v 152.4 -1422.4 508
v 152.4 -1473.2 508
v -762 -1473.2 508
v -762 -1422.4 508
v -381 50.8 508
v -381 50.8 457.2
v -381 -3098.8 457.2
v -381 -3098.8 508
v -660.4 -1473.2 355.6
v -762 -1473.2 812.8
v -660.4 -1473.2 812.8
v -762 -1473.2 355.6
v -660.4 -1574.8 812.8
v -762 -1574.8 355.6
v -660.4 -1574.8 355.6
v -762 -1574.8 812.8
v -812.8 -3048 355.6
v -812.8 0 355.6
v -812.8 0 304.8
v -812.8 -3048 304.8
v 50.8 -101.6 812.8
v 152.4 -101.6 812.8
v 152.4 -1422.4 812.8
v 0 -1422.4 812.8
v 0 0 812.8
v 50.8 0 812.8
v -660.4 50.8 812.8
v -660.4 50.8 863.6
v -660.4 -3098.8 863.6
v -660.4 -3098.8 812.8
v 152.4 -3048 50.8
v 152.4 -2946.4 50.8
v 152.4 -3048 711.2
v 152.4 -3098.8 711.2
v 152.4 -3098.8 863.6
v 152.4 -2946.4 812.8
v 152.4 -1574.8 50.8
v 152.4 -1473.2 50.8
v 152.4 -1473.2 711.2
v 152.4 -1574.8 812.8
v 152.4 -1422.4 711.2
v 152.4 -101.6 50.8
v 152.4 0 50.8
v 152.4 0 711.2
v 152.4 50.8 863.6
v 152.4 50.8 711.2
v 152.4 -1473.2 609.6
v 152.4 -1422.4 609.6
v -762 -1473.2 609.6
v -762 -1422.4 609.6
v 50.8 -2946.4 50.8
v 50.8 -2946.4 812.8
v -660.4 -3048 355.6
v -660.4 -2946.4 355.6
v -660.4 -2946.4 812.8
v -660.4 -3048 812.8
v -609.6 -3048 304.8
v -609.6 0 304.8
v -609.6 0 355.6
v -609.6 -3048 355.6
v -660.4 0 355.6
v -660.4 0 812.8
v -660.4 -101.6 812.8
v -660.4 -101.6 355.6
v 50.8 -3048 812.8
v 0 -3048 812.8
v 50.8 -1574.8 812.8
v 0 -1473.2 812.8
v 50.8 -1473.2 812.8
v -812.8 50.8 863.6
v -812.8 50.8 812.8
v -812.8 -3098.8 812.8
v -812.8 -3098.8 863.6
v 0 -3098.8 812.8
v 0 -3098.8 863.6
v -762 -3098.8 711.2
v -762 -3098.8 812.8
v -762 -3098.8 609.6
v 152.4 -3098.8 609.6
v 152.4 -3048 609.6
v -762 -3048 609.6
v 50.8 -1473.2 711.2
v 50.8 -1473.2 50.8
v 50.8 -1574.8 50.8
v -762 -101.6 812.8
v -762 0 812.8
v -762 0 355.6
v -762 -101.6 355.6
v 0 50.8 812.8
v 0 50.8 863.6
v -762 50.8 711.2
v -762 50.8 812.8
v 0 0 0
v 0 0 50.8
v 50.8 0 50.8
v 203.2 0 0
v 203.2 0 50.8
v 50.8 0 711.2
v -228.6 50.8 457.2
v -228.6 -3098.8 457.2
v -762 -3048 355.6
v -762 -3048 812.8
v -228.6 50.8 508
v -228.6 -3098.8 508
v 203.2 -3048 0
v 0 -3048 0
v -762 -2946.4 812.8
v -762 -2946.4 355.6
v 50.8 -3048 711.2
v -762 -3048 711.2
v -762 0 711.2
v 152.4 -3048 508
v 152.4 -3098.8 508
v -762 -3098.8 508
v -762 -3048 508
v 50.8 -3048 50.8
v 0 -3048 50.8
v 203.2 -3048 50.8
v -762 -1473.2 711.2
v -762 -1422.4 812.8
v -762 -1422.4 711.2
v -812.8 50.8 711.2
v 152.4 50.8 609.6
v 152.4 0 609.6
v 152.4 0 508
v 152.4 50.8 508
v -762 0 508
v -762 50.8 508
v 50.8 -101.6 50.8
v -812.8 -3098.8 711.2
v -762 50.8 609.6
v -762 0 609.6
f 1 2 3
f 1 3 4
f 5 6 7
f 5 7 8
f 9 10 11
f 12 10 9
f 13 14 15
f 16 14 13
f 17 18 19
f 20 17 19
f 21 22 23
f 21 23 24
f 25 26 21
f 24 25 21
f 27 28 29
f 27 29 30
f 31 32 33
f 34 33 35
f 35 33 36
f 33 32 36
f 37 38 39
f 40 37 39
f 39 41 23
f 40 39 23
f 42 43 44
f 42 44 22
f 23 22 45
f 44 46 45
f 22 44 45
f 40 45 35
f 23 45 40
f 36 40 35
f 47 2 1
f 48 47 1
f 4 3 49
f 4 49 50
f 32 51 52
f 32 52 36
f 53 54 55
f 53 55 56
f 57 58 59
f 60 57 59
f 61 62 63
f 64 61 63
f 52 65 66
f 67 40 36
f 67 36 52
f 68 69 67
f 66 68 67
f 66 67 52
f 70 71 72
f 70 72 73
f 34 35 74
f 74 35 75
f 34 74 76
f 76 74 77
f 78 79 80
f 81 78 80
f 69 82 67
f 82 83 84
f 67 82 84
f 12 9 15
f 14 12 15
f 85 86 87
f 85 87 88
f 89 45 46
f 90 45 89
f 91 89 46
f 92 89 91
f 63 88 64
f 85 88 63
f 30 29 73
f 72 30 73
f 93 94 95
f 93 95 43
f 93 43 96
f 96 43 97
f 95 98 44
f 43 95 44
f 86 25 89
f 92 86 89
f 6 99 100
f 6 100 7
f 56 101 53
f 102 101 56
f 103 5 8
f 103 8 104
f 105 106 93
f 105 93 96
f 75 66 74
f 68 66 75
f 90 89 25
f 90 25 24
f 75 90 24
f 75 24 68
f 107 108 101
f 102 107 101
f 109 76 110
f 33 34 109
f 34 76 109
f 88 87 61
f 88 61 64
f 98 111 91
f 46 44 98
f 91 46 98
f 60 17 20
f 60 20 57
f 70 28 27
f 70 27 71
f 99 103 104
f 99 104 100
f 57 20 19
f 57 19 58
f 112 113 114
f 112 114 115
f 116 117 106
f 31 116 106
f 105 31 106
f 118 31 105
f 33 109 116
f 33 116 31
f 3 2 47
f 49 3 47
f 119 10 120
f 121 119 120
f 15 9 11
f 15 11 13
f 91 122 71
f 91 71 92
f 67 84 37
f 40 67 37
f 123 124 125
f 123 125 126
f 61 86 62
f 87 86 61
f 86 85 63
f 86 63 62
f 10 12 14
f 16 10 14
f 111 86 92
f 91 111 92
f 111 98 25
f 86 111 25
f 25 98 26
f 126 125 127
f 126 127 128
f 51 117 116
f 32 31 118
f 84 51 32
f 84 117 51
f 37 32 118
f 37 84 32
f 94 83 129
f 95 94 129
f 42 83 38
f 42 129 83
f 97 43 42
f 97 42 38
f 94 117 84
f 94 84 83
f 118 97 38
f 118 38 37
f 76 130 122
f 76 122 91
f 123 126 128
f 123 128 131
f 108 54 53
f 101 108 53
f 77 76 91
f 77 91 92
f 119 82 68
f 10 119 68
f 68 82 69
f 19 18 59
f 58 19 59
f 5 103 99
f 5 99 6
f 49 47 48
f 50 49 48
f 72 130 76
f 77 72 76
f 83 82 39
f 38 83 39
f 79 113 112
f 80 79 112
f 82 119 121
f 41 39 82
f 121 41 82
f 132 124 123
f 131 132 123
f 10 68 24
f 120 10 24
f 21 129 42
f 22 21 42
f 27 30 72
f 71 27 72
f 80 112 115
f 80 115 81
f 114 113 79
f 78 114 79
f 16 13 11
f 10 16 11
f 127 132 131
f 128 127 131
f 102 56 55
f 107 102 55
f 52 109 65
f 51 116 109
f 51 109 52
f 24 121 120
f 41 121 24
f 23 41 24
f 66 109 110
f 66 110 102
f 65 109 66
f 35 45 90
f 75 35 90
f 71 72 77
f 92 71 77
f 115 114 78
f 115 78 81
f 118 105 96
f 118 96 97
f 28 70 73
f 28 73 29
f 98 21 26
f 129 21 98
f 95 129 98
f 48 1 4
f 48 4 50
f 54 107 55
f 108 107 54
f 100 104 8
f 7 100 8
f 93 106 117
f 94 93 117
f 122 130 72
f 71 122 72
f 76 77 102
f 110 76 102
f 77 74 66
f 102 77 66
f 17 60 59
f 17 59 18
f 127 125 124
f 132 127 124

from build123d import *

# Parameters (mm, degrees)
F0_W      = 203.2
F0_H      = 50.8
F1_DEPTH  = 3048
F2_W      = 101.6
F2_H      = 101.6
F2_H_2    = 50.8
F3_DEPTH  = 762
F4_W      = 50.8
F4_H      = 101.6
F5_DEPTH  = 914.4
F6_W      = 50.8
F6_H      = 101.6
F7_DEPTH  = 914.4
F8_W      = 50.8
F8_H      = 101.6
F9_DEPTH  = 914.4
F13_DEPTH = 101.6
F14_W     = 50.8
F14_H     = 101.6
F15_DEPTH = 3149.6
F17_DEPTH = 3048
F18_W     = 50.8
F18_H     = 101.6
F19_DEPTH = 914.4
F20_W     = 50.8
F20_H     = 101.6
F21_DEPTH = 914.4
F22_W     = 50.8
F22_H     = 101.6
F23_DEPTH = 914.4
F24_W     = 152.4
F24_H     = 50.8
F25_DEPTH = 3149.6
F27_DEPTH = 3149.6
F29_DEPTH = 3149.6


with BuildPart() as f1:
    # F0 (on Front) → F1 (new body)
    with BuildSketch(Plane.XZ):
        with Locations((101.6, 25.4)):
            Rectangle(F0_W, F0_H)
    extrude(amount=F1_DEPTH)

    # F2 (on face) → F3 (join)
    with BuildSketch(Plane.XY.offset(50.8)):
        with Locations((101.6, -2997.2)):
            Rectangle(F2_W, F2_H)
        with Locations((101.6, -1549.4)):
            Rectangle(F2_W, F2_H_2)
        with Locations((101.6, -1498.6)):
            Rectangle(F2_W, F2_H_2)
        with Locations((101.6, -50.8)):
            Rectangle(F2_W, F2_H)
    extrude(amount=F3_DEPTH)

    # F4 (on face) → F5 (join)
    with BuildSketch(Plane.YZ.offset(152.4)):
        with Locations((25.4, 762)):
            Rectangle(F4_W, F4_H)
    extrude(amount=-F5_DEPTH)

    # F6 (on face) → F7 (join)
    with BuildSketch(Plane.YZ.offset(152.4)):
        with Locations((-3073.4, 762)):
            Rectangle(F6_W, F6_H)
    extrude(amount=-F7_DEPTH)

    # F8 (on face) → F9 (join)
    with BuildSketch(Plane.YZ.offset(152.4)):
        with Locations((-1447.8, 762)):
            Rectangle(F8_W, F8_H)
    extrude(amount=-F9_DEPTH)

    # F24 (on face) → F25 (join)
    with BuildSketch(Plane(origin=(0, 50.8, 0), x_dir=(-1, 0, 0), z_dir=(0, 1, 0))):
        with Locations((-76.2, 838.2)):
            Rectangle(F24_W, F24_H)
    extrude(amount=-F25_DEPTH)


with BuildPart() as f13:
    # F10 (on face) + F12 (on face) + F11 (on face) → F13 (new body)
    with BuildSketch(Plane(origin=(-762, 0, 0), x_dir=(0, -1, 0), z_dir=(-1, 0, 0))):
        Polygon((3048, 711.2), (3048, 812.8), (2946.4, 812.8), (2946.4, 355.6), (3048, 355.6), align=None)
    with BuildSketch(Plane(origin=(-762, 0, 0), x_dir=(0, -1, 0), z_dir=(-1, 0, 0))):
        Polygon((1574.8, 812.8), (1473.2, 812.8), (1473.2, 711.2), (1473.2, 355.6), (1574.8, 355.6), align=None)
    with BuildSketch(Plane(origin=(-762, 0, 0), x_dir=(0, -1, 0), z_dir=(-1, 0, 0))):
        Polygon((101.6, 812.8), (0, 812.8), (0, 711.2), (0, 355.6), (101.6, 355.6), align=None)
    extrude(amount=-F13_DEPTH)


with BuildPart() as f15:
    # F14 (on face) → F15 (new body)
    with BuildSketch(Plane.XZ.offset(3098.8)):
        with Locations((-787.4, 762)):
            Rectangle(F14_W, F14_H)
    extrude(amount=-F15_DEPTH)


with BuildPart() as f17:
    # F16 (on face) → F17 (new body)
    with BuildSketch(Plane.XZ.offset(3048)):
        Polygon((-609.6, 355.6), (-660.4, 355.6), (-762, 355.6), (-812.8, 355.6), (-812.8, 304.8), (-609.6, 304.8), align=None)
    extrude(amount=-F17_DEPTH)


with BuildPart() as f19:
    # F18 (on face) → F19 (new body)
    with BuildSketch(Plane.YZ.offset(152.4)):
        with Locations((25.4, 558.8)):
            Rectangle(F18_W, F18_H)
    extrude(amount=-F19_DEPTH)


with BuildPart() as f21:
    # F20 (on face) → F21 (new body)
    with BuildSketch(Plane.YZ.offset(152.4)):
        with Locations((-1447.8, 558.8)):
            Rectangle(F20_W, F20_H)
    extrude(amount=-F21_DEPTH)


with BuildPart() as f23:
    # F22 (on face) → F23 (new body)
    with BuildSketch(Plane.YZ.offset(152.4)):
        with Locations((-3073.4, 558.8)):
            Rectangle(F22_W, F22_H)
    extrude(amount=-F23_DEPTH)


with BuildPart() as f27:
    # F26 (on face) → F27 (new body)
    with BuildSketch(Plane(origin=(0, 50.8, 0), x_dir=(-1, 0, 0), z_dir=(0, 1, 0))):
        Polygon((762, 812.8), (812.8, 812.8), (812.8, 863.6), (660.4, 863.6), (660.4, 812.8), align=None)
    extrude(amount=-F27_DEPTH)


with BuildPart() as f29:
    # F28 (on face) → F29 (new body)
    with BuildSketch(Plane(origin=(0, 50.8, 0), x_dir=(-1, 0, 0), z_dir=(0, 1, 0))):
        Polygon((304.8, 508), (228.6, 508), (228.6, 457.2), (381, 457.2), (381, 508), align=None)
    extrude(amount=-F29_DEPTH)


solid = Compound([f1.part, f13.part, f15.part, f17.part, f19.part, f21.part, f23.part, f27.part, f29.part])
